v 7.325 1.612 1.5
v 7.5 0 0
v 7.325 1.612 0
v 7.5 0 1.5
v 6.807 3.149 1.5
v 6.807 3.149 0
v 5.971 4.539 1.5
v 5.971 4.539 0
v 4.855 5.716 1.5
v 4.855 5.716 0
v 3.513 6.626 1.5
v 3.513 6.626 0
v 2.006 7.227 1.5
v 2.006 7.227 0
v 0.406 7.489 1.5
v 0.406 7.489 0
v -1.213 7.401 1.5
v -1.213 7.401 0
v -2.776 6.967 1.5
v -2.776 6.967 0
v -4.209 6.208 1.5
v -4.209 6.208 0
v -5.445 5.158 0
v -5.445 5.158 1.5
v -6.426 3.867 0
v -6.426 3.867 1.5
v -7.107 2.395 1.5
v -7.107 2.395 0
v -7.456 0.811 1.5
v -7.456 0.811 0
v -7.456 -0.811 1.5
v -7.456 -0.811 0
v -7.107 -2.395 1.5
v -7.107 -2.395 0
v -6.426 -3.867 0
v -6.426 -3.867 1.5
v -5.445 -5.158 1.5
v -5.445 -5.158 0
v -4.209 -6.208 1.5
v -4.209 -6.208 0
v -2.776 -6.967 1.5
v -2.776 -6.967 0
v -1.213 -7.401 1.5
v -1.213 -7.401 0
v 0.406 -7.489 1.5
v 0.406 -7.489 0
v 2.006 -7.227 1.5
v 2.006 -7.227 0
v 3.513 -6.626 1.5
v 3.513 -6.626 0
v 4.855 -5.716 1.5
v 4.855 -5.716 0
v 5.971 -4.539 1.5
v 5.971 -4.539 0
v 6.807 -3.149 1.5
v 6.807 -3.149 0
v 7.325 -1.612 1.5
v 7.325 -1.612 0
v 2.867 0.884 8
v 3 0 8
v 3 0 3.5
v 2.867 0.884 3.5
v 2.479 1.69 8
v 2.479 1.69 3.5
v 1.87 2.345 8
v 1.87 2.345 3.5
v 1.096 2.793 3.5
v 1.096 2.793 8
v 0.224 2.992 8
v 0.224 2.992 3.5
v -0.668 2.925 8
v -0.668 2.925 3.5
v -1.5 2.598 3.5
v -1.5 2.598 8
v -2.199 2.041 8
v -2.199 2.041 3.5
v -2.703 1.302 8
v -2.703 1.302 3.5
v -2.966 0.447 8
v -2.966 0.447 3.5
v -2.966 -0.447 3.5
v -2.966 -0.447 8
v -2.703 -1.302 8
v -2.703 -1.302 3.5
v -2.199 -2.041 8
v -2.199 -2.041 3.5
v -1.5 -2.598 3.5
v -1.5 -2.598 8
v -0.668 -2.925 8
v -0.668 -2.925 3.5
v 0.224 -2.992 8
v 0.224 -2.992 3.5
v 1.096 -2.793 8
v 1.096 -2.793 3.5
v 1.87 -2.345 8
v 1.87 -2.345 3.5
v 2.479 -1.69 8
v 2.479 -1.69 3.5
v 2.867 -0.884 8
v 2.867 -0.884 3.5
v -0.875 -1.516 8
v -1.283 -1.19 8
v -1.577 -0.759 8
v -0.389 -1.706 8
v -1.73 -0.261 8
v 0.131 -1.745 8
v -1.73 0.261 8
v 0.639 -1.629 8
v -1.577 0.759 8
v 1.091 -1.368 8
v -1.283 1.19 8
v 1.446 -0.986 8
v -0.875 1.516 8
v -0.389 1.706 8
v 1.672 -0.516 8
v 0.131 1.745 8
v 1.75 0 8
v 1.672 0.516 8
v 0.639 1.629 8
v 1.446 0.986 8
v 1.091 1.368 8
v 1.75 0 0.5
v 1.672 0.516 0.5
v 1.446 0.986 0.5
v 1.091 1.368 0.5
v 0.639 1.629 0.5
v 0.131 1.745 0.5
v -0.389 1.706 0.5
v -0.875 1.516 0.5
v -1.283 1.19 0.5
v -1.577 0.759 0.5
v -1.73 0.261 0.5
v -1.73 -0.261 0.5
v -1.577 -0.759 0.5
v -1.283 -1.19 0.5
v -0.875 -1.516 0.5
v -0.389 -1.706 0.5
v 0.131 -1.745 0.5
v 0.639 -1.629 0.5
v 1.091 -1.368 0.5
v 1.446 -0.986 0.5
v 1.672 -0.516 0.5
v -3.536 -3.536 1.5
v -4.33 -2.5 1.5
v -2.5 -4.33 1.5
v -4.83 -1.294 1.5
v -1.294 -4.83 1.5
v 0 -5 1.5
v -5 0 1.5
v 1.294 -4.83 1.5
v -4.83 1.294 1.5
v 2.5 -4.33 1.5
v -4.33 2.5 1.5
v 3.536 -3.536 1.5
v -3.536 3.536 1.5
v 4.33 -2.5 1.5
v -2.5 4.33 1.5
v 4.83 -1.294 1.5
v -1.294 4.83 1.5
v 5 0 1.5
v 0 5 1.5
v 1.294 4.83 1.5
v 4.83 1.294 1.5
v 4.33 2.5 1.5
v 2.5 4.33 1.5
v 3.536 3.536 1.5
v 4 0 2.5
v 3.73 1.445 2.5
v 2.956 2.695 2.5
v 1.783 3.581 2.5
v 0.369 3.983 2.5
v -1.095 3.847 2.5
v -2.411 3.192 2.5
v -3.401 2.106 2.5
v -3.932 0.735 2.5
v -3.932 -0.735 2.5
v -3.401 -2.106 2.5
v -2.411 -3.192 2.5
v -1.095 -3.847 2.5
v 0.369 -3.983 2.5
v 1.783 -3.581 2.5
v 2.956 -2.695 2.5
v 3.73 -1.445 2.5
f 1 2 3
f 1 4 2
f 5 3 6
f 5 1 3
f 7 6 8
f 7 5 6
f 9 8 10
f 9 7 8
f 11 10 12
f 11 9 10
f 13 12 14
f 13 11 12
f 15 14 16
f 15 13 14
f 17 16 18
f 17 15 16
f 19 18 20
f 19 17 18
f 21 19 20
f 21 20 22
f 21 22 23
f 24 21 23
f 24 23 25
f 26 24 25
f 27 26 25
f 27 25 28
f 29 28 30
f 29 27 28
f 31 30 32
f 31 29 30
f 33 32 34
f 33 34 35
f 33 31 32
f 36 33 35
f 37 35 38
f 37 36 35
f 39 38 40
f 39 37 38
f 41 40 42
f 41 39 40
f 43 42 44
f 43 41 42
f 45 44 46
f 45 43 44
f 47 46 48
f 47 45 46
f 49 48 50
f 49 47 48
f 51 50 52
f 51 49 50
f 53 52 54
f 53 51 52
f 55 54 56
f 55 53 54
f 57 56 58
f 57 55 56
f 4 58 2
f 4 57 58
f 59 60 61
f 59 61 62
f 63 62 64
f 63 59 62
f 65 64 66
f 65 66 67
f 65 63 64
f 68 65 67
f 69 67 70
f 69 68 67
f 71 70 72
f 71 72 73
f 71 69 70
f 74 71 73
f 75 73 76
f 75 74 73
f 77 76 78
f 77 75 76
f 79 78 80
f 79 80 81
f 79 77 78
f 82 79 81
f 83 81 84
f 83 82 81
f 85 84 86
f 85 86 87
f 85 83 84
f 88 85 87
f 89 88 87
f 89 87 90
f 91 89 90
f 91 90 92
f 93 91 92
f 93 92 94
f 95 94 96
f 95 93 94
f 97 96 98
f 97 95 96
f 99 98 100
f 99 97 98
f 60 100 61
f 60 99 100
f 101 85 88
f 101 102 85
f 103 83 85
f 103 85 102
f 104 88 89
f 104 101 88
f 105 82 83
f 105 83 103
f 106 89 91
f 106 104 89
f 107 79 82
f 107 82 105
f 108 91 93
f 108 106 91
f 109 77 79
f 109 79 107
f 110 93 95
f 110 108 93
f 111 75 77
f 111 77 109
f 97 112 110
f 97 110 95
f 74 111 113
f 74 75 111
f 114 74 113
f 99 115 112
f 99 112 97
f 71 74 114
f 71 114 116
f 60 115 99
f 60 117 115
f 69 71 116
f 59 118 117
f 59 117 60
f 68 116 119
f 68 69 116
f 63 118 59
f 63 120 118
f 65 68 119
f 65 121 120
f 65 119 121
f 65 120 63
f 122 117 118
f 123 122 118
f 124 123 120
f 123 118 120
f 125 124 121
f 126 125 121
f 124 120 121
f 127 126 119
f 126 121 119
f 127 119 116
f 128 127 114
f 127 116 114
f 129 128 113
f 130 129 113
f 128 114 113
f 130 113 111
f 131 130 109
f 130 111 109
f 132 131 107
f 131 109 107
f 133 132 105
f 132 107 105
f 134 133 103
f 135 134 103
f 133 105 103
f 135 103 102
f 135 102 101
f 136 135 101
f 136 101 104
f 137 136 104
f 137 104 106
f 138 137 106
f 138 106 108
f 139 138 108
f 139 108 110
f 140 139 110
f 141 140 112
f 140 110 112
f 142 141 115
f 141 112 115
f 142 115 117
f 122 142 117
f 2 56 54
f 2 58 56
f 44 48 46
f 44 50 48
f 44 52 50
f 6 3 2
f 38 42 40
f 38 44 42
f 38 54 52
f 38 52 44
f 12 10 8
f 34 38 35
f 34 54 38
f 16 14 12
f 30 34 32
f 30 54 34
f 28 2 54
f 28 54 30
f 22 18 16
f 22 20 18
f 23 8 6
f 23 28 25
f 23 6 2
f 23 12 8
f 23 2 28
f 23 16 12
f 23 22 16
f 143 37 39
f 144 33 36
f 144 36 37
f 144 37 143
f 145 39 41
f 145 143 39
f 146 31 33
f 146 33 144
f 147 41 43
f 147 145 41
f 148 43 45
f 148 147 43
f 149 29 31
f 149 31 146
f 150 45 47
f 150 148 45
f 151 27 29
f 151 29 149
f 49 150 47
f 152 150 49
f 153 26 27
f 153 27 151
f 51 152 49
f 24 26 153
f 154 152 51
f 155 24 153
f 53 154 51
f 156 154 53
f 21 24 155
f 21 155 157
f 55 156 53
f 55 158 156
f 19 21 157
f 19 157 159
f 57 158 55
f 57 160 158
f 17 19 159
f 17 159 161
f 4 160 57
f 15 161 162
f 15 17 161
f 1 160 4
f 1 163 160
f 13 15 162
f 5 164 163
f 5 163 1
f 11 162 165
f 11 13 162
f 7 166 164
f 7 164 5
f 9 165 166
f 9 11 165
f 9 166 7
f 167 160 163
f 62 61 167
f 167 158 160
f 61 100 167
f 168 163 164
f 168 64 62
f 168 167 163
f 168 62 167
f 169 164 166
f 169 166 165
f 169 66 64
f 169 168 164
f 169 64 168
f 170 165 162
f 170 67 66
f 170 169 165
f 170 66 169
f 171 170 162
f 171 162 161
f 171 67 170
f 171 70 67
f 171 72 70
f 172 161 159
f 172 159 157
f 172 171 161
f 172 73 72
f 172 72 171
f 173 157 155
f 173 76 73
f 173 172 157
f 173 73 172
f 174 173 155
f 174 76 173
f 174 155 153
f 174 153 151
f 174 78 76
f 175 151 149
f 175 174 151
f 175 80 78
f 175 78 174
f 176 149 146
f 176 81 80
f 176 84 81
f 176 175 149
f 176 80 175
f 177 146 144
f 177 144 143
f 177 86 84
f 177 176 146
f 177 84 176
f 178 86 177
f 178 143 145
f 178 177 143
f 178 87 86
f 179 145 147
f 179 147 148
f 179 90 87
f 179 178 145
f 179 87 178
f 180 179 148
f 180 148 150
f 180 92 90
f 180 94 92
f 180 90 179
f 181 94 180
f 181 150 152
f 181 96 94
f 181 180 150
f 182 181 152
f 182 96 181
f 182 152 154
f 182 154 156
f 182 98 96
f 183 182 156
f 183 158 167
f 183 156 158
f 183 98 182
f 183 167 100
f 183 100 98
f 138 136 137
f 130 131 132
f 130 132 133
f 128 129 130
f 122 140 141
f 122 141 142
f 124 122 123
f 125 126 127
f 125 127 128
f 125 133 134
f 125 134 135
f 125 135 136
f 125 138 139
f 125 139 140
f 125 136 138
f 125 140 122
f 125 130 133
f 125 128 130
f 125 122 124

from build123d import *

# Parameters (mm, degrees)
F2_R     = 1.75
F3_DEPTH = 7.5
F4_SIZE  = 2


with BuildPart() as f1:
    # F0 (on Front) → F1 (revolve)
    with BuildSketch(Plane.XZ):
        Polygon((0, 8), (0, 0), (7.5, 0), (7.5, 1.5), (3, 1.5), (3, 8), align=None)
    revolve(axis=Axis((0, 0, 7.429687), (0, 0, 1)))

    # F2 (on face) → F3 (cut)
    with BuildSketch(Plane.XY.offset(8)):
        Circle(F2_R)
    extrude(amount=-F3_DEPTH, mode=Mode.SUBTRACT)

    # F4
    f4_edges = [f1.edges().sort_by_distance(p)[0] for p in [
        (-3, 0, 1.5),
    ]]
    chamfer(f4_edges, length=F4_SIZE)


solid = f1.part
